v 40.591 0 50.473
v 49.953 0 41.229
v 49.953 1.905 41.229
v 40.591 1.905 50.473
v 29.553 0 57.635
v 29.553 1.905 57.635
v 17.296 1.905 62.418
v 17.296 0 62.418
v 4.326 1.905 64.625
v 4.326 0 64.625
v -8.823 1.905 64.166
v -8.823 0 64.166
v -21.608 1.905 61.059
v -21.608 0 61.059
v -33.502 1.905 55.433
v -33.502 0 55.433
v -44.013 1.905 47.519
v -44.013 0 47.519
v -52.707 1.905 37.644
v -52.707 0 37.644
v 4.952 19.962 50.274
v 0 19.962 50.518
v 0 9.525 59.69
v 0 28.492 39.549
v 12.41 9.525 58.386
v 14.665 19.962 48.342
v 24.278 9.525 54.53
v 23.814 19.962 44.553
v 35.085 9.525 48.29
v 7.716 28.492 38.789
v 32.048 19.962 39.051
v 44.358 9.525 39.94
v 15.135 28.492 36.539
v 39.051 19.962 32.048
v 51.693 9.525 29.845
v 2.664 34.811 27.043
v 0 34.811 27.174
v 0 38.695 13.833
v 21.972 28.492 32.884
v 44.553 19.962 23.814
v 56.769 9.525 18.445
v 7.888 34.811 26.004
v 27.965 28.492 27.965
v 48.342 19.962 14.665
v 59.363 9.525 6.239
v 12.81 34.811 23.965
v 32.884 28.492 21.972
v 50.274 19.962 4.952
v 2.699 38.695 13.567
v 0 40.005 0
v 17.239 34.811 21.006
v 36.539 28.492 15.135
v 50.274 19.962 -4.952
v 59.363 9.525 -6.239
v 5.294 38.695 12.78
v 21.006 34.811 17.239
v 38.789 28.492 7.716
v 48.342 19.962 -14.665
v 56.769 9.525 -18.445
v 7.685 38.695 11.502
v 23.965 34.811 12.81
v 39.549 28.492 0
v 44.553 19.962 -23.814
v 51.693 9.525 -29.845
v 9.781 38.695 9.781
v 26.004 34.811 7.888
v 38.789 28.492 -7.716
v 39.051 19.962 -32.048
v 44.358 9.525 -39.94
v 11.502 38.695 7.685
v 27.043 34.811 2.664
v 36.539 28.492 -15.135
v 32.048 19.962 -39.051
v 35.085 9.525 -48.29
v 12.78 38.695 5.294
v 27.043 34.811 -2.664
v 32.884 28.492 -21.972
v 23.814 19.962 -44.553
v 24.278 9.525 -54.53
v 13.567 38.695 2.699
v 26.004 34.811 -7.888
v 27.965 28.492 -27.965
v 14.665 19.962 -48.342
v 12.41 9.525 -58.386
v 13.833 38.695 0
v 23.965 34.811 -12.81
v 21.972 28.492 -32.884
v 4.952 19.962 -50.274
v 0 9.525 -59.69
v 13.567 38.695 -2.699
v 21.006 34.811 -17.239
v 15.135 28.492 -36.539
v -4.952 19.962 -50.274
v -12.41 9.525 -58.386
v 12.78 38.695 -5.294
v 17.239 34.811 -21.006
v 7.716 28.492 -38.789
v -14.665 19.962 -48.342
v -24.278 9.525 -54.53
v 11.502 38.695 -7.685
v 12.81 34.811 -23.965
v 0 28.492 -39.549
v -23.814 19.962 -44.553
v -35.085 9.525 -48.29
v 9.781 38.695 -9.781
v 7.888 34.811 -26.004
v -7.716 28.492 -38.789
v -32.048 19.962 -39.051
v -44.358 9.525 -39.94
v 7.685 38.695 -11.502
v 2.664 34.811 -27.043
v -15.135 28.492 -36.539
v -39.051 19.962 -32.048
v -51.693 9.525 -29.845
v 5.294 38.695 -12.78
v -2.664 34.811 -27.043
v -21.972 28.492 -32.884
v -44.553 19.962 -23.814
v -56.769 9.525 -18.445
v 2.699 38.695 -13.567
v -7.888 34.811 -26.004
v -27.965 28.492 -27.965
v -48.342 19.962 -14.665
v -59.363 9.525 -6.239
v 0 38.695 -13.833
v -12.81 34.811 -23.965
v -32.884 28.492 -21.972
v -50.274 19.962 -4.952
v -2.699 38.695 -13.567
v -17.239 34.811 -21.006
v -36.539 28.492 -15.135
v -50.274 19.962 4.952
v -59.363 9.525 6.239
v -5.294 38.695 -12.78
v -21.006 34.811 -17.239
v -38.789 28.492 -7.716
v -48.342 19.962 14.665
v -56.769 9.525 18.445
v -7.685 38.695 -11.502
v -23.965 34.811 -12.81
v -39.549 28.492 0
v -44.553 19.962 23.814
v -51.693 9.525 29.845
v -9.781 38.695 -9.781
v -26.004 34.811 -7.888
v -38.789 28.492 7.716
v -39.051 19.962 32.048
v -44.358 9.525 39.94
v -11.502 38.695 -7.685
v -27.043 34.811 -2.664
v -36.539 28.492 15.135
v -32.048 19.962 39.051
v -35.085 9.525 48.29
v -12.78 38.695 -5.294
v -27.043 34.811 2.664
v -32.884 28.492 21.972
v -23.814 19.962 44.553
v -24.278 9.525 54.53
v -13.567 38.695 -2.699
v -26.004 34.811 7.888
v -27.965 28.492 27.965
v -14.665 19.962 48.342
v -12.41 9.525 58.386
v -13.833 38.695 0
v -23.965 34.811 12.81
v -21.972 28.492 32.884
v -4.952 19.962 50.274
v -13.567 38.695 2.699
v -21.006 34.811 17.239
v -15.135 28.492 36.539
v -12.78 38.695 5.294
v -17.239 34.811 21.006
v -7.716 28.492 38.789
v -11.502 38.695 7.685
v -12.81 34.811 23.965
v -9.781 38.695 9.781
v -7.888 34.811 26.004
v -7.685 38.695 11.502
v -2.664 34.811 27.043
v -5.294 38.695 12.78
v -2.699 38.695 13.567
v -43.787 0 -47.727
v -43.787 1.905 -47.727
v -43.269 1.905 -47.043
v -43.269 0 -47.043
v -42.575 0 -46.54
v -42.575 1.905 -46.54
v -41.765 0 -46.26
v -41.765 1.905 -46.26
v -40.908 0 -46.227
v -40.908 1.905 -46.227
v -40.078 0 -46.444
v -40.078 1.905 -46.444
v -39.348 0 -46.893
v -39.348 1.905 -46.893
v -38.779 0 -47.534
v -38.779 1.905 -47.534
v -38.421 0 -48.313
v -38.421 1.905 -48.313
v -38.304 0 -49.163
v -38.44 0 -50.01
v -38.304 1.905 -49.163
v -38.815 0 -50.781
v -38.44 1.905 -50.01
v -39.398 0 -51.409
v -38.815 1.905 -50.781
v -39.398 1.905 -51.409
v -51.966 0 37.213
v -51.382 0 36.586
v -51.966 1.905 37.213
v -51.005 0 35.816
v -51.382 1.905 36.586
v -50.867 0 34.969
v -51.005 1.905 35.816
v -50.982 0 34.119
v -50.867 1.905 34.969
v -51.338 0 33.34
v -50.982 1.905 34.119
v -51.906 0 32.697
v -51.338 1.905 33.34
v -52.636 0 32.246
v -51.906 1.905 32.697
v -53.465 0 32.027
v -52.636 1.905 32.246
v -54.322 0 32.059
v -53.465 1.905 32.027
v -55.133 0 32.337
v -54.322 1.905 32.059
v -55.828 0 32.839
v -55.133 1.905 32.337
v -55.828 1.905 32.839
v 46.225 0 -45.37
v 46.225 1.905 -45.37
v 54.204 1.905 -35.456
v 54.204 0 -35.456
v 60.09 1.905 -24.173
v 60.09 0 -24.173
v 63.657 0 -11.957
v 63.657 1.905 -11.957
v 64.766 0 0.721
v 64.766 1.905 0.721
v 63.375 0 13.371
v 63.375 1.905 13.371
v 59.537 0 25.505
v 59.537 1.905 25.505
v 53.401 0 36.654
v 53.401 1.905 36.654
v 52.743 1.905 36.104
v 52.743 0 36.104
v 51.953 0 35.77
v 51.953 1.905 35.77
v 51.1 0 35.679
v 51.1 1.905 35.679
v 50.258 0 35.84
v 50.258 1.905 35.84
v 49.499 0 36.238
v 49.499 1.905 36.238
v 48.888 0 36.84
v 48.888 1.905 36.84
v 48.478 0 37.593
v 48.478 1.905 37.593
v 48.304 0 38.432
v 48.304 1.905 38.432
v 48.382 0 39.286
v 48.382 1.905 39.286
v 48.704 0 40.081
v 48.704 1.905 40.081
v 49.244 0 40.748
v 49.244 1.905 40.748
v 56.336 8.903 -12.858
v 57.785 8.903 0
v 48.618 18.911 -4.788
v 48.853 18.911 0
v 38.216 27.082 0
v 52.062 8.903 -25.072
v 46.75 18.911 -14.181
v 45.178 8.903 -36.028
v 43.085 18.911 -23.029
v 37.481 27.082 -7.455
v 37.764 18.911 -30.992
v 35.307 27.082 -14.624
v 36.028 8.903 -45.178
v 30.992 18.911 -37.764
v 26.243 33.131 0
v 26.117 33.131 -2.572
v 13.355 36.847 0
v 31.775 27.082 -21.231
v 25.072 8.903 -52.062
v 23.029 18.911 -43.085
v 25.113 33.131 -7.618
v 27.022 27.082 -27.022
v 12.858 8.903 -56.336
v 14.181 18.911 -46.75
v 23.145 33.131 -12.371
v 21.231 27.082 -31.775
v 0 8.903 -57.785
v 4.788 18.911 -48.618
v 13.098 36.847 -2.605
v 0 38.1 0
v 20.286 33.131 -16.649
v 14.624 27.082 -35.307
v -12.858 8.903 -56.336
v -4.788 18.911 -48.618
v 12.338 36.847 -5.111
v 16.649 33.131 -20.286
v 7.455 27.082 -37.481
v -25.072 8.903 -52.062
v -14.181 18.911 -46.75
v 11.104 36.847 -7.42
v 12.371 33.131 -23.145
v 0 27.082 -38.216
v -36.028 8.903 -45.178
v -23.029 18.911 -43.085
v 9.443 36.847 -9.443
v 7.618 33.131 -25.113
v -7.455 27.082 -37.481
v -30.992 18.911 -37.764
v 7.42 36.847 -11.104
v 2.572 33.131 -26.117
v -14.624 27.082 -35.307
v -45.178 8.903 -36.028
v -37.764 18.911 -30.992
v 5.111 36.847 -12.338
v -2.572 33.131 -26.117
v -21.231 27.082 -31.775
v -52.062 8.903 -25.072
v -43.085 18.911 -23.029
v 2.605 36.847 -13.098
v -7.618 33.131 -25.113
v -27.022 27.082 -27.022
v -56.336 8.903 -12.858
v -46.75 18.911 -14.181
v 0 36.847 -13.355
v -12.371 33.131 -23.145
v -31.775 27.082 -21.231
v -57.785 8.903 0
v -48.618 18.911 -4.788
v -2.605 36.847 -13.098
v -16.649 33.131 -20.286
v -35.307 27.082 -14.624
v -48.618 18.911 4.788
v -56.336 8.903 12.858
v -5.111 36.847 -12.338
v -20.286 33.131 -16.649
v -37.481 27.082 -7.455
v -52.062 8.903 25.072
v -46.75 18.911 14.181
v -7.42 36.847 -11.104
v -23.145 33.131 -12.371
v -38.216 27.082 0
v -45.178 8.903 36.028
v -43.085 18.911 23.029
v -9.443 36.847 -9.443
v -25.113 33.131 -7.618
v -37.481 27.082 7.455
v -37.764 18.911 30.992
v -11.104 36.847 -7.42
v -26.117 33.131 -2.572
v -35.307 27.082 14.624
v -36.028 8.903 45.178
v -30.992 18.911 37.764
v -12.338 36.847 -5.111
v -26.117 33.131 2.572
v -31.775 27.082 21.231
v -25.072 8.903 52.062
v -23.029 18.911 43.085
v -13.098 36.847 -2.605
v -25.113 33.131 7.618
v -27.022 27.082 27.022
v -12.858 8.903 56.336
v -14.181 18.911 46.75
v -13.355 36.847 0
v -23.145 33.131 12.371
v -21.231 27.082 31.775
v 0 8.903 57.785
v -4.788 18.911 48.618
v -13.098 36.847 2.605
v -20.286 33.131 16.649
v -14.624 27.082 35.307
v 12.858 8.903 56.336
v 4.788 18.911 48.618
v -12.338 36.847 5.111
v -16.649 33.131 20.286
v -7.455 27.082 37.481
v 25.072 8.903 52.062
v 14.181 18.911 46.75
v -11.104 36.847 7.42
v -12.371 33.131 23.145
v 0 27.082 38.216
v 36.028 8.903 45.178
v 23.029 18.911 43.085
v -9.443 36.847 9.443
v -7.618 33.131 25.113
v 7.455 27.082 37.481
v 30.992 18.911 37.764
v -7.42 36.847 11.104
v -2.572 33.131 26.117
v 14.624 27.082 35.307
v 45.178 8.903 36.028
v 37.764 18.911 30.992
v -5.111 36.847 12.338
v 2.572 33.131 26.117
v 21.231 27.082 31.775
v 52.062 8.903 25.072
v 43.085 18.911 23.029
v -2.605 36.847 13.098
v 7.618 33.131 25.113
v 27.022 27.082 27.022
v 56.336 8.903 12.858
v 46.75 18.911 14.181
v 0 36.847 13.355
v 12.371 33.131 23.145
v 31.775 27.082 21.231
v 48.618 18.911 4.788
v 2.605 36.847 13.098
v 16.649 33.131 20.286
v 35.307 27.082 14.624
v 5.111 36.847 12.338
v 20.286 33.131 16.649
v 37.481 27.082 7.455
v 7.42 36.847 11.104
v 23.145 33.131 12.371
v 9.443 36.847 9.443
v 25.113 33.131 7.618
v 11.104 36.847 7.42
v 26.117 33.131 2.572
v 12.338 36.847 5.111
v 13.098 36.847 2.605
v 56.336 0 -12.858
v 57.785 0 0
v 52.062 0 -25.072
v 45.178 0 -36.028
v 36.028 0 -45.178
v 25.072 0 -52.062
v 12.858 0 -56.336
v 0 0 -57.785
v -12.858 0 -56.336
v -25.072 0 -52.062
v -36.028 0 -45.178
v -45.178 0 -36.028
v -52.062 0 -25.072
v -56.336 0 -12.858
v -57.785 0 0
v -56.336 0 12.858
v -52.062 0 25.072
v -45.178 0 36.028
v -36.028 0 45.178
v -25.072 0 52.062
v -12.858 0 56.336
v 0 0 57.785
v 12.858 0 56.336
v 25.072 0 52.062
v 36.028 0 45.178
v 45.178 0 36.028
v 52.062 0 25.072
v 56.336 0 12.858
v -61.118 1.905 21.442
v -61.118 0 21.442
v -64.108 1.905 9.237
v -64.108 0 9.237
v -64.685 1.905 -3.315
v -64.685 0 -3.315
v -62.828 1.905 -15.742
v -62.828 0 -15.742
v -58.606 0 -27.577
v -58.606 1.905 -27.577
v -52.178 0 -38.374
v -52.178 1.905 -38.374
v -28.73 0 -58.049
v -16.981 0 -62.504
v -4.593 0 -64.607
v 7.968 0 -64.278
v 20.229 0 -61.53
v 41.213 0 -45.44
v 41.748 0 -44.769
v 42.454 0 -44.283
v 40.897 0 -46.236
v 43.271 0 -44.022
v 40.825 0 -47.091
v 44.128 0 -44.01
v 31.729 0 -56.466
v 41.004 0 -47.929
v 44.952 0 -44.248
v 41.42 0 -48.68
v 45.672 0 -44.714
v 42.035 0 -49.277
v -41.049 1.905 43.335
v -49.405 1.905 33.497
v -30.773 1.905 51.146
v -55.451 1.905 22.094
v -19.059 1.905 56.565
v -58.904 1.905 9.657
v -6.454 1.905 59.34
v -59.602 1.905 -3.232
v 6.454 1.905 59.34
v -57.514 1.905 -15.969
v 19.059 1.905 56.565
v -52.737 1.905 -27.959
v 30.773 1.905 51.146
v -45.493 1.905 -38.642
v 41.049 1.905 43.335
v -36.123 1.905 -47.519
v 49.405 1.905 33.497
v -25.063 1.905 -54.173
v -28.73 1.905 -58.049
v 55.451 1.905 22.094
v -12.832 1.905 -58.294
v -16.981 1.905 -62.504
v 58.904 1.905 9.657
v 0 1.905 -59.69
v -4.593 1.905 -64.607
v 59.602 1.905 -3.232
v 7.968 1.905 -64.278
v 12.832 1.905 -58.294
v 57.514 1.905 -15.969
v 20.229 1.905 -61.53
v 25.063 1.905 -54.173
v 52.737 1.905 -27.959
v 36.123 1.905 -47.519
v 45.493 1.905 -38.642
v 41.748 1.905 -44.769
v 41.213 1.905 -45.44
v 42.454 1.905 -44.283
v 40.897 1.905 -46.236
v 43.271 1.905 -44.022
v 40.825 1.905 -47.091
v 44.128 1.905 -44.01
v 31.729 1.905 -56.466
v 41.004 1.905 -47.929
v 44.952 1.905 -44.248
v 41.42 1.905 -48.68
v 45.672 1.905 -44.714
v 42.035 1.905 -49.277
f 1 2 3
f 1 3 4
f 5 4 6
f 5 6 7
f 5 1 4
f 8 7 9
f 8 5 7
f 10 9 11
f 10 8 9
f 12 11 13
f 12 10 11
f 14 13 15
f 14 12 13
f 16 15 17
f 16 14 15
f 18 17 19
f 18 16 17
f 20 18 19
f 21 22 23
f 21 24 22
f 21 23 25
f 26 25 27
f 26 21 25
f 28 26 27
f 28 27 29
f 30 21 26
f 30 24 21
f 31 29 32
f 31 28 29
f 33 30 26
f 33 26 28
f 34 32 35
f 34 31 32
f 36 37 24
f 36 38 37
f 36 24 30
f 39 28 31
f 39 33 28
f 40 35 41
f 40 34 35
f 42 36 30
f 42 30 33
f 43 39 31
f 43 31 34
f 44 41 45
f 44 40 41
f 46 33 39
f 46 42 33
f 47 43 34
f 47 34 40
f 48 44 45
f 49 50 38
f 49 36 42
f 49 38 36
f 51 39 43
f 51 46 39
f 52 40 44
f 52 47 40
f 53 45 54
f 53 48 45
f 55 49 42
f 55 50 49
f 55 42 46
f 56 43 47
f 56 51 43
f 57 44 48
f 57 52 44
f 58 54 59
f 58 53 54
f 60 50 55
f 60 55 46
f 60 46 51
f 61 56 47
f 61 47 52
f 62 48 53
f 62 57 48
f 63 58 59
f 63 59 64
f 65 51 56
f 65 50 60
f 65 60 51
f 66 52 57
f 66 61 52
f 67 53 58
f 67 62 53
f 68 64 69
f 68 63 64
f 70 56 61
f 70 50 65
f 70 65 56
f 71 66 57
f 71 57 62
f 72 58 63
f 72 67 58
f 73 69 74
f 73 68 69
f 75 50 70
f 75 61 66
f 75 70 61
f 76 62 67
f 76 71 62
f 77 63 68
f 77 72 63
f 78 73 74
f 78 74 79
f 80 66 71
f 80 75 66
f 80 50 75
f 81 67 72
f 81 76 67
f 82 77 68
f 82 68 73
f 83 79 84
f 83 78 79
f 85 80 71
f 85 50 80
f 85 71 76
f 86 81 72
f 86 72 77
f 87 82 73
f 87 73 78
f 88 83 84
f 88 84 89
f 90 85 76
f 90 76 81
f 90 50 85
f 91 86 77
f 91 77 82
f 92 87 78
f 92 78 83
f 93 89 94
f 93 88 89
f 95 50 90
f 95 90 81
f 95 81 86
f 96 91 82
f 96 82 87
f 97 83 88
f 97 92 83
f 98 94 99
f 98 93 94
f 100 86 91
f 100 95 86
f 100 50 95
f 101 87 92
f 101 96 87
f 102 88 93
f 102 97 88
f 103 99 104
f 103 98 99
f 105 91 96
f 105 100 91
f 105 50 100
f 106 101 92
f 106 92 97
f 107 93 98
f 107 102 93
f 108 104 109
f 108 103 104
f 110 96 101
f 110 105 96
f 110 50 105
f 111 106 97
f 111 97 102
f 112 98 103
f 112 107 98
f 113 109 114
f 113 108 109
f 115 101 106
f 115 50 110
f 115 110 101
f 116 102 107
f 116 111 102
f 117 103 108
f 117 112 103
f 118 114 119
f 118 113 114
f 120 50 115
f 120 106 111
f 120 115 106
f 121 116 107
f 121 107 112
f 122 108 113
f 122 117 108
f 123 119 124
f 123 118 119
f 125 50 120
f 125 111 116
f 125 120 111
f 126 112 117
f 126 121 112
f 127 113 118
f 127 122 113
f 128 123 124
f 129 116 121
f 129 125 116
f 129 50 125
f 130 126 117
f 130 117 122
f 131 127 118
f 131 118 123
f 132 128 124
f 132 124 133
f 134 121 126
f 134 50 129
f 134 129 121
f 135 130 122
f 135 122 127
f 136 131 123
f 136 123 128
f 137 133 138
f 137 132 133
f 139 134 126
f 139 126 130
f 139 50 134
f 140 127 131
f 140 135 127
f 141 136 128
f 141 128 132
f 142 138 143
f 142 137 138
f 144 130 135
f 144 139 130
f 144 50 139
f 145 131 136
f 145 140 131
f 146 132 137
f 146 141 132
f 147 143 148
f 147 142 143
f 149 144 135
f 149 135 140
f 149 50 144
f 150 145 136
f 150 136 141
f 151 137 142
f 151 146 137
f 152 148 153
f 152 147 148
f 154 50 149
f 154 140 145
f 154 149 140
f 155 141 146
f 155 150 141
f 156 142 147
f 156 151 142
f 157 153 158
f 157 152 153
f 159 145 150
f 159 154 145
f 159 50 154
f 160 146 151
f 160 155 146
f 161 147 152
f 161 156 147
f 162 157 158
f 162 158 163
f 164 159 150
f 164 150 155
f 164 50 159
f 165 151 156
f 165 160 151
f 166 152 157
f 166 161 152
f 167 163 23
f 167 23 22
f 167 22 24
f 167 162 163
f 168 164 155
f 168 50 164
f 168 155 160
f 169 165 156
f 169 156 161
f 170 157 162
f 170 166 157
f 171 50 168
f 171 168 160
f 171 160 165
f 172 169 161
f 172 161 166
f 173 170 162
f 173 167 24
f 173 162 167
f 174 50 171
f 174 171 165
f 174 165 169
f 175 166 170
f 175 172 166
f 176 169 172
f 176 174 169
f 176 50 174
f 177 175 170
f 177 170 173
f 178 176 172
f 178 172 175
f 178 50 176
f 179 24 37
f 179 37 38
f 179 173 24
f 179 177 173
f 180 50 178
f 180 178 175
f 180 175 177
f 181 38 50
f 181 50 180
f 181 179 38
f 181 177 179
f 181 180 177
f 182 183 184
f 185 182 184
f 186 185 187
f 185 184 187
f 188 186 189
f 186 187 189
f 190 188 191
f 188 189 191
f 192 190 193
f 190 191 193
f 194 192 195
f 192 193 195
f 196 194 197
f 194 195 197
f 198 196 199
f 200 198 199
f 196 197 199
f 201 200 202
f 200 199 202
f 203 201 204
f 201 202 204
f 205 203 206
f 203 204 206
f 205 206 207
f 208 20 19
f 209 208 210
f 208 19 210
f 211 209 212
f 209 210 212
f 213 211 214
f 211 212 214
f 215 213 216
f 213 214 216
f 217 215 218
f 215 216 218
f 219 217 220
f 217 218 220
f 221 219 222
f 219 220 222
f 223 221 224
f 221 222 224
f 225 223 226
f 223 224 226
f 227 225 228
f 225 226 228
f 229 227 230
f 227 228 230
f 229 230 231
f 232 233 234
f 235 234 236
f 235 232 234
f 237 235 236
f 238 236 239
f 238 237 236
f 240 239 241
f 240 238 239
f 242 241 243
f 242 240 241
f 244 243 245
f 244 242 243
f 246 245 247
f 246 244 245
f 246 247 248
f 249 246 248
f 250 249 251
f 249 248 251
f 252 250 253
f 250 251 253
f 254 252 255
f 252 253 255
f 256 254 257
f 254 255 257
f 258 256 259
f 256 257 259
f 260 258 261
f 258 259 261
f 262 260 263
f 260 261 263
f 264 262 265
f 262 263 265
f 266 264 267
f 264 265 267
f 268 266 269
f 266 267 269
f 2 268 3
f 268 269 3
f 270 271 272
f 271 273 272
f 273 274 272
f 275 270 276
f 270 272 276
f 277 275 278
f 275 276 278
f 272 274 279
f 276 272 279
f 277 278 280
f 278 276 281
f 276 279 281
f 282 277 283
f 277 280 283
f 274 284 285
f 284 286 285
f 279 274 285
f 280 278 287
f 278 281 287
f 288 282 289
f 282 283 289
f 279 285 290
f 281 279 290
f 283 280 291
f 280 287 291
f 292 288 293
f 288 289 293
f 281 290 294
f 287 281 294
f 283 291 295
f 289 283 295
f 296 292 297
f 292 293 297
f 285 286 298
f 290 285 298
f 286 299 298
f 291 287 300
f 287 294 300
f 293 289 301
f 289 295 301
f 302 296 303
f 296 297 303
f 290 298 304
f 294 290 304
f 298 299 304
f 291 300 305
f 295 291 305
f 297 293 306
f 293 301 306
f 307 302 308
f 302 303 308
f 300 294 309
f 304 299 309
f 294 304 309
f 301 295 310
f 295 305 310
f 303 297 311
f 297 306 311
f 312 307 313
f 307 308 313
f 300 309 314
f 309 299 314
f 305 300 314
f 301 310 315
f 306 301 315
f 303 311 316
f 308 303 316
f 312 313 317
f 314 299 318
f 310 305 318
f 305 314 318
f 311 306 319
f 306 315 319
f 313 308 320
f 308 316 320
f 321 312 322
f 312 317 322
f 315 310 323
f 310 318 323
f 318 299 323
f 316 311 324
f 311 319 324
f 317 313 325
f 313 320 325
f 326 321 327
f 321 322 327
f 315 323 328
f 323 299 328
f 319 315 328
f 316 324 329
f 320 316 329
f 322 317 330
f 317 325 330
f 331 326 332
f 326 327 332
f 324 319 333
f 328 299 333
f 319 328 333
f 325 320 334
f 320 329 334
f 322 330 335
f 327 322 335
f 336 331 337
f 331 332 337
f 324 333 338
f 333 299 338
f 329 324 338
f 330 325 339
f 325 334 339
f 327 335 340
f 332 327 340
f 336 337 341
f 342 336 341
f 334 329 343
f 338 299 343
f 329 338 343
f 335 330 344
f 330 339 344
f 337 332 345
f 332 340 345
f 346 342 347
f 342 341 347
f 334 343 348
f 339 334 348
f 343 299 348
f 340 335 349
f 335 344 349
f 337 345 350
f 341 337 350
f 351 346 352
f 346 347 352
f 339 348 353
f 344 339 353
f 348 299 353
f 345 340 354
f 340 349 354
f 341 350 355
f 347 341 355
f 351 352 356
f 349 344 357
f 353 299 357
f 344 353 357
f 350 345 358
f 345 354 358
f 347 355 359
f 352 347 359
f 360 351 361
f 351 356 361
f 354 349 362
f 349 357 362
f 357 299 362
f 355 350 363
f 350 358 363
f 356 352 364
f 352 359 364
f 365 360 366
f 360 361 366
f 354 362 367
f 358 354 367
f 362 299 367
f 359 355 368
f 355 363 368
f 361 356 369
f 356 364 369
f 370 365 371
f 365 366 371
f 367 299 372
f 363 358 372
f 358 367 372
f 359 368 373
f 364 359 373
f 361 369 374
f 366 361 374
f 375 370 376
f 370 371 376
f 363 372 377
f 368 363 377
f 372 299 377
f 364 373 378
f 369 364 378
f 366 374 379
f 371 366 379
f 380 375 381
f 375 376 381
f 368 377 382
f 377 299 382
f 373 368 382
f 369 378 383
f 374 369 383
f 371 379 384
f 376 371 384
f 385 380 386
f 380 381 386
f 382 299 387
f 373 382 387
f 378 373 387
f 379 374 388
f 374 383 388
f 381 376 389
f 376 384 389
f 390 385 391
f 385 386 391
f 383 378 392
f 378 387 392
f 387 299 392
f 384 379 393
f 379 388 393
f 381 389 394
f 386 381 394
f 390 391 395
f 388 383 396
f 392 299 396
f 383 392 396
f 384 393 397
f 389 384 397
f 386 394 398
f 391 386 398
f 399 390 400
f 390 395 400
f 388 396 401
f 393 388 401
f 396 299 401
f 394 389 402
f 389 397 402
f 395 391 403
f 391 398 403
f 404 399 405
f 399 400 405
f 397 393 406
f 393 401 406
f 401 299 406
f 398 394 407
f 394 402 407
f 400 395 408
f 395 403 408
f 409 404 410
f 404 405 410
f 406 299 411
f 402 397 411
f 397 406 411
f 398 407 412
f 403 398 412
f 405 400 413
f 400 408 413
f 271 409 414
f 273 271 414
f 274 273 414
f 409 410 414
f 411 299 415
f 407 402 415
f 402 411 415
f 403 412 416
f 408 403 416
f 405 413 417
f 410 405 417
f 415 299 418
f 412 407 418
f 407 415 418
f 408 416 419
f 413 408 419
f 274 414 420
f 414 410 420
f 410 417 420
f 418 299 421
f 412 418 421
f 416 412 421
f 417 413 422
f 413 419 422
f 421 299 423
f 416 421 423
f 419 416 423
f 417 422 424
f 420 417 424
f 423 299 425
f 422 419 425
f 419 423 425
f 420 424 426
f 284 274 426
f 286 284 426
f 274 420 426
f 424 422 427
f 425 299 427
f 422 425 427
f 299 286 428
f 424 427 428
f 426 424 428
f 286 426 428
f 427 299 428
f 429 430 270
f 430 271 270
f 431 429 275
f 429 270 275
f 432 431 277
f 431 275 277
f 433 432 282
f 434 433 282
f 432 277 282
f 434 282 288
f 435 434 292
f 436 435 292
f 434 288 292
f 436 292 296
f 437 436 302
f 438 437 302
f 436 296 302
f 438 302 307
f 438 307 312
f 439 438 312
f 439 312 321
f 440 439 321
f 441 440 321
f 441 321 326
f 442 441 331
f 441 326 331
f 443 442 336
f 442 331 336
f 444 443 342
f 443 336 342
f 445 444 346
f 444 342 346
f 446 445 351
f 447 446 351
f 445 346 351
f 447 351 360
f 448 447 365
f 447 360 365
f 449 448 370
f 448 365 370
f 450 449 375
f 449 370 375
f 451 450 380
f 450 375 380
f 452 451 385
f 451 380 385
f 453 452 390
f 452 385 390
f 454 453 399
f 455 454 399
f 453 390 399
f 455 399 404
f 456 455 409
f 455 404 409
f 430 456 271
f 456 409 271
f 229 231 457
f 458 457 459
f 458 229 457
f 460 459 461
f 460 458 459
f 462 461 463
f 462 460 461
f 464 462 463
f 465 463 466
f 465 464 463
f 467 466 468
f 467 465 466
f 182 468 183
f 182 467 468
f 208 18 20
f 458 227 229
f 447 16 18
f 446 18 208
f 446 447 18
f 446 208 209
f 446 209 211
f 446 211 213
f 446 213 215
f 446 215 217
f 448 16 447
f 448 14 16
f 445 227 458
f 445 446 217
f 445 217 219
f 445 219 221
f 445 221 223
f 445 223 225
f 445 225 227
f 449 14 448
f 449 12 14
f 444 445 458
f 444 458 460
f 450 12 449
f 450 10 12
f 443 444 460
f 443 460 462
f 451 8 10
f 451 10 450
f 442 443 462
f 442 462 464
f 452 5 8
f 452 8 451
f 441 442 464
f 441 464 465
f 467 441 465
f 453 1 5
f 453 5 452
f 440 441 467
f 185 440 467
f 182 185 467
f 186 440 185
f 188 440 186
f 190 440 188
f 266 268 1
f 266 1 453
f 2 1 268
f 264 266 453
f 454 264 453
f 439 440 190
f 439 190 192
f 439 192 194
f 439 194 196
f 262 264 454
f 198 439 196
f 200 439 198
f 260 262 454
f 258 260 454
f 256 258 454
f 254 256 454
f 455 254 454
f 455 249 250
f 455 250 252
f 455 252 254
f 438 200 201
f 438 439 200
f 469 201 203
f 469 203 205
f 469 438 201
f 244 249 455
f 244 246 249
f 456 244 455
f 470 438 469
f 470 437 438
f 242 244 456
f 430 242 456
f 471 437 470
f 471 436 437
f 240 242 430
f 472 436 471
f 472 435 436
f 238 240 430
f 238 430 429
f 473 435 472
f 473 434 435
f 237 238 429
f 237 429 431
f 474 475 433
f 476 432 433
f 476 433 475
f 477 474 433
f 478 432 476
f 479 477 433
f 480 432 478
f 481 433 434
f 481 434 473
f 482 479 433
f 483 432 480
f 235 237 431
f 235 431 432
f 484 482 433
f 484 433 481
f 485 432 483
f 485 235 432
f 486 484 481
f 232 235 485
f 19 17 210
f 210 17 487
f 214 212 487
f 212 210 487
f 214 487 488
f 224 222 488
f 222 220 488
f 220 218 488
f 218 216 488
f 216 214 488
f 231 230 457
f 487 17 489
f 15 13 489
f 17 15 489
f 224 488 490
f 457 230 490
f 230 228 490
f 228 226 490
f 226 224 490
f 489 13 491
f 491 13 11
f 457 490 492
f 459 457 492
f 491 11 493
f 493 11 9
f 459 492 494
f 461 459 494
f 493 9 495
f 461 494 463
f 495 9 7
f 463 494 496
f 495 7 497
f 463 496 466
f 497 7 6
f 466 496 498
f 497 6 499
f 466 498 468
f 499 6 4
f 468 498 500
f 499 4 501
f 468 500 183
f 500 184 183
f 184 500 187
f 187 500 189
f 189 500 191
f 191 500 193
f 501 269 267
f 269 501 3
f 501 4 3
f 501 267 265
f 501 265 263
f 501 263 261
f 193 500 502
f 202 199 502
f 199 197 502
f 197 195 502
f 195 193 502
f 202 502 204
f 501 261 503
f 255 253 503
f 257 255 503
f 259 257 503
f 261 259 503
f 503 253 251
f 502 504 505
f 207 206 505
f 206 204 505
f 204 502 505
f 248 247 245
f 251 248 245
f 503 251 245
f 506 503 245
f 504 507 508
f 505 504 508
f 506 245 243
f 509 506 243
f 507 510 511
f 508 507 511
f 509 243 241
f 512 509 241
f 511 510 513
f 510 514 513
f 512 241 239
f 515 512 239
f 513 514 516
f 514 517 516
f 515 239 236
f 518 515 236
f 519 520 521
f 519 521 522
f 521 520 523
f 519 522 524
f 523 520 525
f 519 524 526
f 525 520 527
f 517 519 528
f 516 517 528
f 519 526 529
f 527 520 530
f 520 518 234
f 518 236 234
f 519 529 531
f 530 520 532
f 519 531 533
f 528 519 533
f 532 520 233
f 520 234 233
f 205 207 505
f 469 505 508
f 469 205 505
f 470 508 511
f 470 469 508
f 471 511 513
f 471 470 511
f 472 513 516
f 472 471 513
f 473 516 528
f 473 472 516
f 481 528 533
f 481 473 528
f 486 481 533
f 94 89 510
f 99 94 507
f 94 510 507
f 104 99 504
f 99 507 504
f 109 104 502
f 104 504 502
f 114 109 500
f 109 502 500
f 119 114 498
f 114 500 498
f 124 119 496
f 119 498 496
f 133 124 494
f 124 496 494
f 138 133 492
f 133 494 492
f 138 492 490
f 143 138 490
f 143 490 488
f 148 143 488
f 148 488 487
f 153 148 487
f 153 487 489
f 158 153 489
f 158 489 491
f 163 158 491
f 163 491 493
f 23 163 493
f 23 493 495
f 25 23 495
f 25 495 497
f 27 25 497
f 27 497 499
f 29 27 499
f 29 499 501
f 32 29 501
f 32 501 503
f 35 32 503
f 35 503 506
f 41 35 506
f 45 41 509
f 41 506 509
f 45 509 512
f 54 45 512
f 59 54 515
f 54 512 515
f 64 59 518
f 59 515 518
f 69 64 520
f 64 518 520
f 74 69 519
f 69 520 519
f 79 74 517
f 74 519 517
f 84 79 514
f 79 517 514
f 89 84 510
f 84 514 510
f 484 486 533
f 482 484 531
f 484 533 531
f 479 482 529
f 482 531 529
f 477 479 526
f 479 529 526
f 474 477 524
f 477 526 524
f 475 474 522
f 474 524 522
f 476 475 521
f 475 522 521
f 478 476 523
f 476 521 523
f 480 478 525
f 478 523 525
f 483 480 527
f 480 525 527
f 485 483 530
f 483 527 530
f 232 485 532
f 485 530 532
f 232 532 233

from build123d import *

# Parameters (mm, degrees)
SKETCH1_R           = 59.69
DOME_BASE_DEPTH     = 9.525
DOME1_FACE_RADIUS   = 59.69
DOME1_HEIGHT        = 30.48
SKETCH2_R           = 64.77
SKETCH2_R_2         = 59.69
BOSS_EXTRUDE2_DEPTH = 1.905
SKETCH3_R           = 2.921
CUT_EXTRUDE1_DEPTH  = 100.206430235


# Read off the part's stored shape, not the designer's step: Shell1
with BuildPart() as part:
    # Sketch1 → Dome Base (new body)
    with BuildSketch(Plane(origin=(0, 0, 0), x_dir=(1, 0, 0), z_dir=(0, 1, 0))):
        with Locations(Location((0, 0, 0), (0, 0, 90))):
            Circle(SKETCH1_R)
    extrude(amount=DOME_BASE_DEPTH)

    # Dome1: a dome of height H over a round flat face of radius A is a cap of a sphere of radius (A * A + H * H) / (2 * H)
    dome1_r = (DOME1_FACE_RADIUS * DOME1_FACE_RADIUS + DOME1_HEIGHT * DOME1_HEIGHT) / (2 * DOME1_HEIGHT)
    dome1_base = Plane((0, 9.525, 0), z_dir=(0, 1, 0))
    with Locations(dome1_base.offset(DOME1_HEIGHT - dome1_r)):
        dome1_ball = Sphere(dome1_r, mode=Mode.PRIVATE)
    add(split(dome1_ball, bisect_by=dome1_base, keep=Keep.TOP, mode=Mode.PRIVATE))

    # Shell1 outline → Shell1 (revolve, cut)
    with BuildSketch(Plane.XY):
        with BuildLine():
            Line((57.785, 0), (57.785000043, 8.9034161))
            ThreePointArc((57.785000043, 8.9034161), (32.371077914, 30.386404711), (0, 38.1))
            Line((0, 38.1), (0, 0))
            Line((0, 0), (57.785, 0))
        make_face()
    revolve(axis=Axis((0, 0, 0), (0, 1, 0)), mode=Mode.SUBTRACT)

    # Sketch2 → Boss-Extrude2 (add)
    with BuildSketch(Plane.XZ):
        with Locations(Location((0, 0, 0), (0, 0, 270))):
            Circle(SKETCH2_R)
        with Locations(Location((0, 0, 0), (0, 0, 270))):
            Circle(SKETCH2_R_2, mode=Mode.SUBTRACT)
    extrude(amount=-BOSS_EXTRUDE2_DEPTH)

    # Sketch3 → Cut-Extrude1 (cut, through all)
    with BuildSketch(Plane(origin=(0, 1.905, 0), x_dir=(1, 0, 0), z_dir=(0, 1, 0))):
        with Locations((-53.788136875, -34.930424511)):
            Circle(SKETCH3_R)
        with Locations((51.220488437, -38.59740651)):
            Circle(SKETCH3_R)
        with Locations((-41.225183347, 49.130260359)):
            Circle(SKETCH3_R)
        with Locations((43.739964823, 46.905369653)):
            Circle(SKETCH3_R)
    extrude(amount=-CUT_EXTRUDE1_DEPTH, mode=Mode.SUBTRACT)


solid = part.part
